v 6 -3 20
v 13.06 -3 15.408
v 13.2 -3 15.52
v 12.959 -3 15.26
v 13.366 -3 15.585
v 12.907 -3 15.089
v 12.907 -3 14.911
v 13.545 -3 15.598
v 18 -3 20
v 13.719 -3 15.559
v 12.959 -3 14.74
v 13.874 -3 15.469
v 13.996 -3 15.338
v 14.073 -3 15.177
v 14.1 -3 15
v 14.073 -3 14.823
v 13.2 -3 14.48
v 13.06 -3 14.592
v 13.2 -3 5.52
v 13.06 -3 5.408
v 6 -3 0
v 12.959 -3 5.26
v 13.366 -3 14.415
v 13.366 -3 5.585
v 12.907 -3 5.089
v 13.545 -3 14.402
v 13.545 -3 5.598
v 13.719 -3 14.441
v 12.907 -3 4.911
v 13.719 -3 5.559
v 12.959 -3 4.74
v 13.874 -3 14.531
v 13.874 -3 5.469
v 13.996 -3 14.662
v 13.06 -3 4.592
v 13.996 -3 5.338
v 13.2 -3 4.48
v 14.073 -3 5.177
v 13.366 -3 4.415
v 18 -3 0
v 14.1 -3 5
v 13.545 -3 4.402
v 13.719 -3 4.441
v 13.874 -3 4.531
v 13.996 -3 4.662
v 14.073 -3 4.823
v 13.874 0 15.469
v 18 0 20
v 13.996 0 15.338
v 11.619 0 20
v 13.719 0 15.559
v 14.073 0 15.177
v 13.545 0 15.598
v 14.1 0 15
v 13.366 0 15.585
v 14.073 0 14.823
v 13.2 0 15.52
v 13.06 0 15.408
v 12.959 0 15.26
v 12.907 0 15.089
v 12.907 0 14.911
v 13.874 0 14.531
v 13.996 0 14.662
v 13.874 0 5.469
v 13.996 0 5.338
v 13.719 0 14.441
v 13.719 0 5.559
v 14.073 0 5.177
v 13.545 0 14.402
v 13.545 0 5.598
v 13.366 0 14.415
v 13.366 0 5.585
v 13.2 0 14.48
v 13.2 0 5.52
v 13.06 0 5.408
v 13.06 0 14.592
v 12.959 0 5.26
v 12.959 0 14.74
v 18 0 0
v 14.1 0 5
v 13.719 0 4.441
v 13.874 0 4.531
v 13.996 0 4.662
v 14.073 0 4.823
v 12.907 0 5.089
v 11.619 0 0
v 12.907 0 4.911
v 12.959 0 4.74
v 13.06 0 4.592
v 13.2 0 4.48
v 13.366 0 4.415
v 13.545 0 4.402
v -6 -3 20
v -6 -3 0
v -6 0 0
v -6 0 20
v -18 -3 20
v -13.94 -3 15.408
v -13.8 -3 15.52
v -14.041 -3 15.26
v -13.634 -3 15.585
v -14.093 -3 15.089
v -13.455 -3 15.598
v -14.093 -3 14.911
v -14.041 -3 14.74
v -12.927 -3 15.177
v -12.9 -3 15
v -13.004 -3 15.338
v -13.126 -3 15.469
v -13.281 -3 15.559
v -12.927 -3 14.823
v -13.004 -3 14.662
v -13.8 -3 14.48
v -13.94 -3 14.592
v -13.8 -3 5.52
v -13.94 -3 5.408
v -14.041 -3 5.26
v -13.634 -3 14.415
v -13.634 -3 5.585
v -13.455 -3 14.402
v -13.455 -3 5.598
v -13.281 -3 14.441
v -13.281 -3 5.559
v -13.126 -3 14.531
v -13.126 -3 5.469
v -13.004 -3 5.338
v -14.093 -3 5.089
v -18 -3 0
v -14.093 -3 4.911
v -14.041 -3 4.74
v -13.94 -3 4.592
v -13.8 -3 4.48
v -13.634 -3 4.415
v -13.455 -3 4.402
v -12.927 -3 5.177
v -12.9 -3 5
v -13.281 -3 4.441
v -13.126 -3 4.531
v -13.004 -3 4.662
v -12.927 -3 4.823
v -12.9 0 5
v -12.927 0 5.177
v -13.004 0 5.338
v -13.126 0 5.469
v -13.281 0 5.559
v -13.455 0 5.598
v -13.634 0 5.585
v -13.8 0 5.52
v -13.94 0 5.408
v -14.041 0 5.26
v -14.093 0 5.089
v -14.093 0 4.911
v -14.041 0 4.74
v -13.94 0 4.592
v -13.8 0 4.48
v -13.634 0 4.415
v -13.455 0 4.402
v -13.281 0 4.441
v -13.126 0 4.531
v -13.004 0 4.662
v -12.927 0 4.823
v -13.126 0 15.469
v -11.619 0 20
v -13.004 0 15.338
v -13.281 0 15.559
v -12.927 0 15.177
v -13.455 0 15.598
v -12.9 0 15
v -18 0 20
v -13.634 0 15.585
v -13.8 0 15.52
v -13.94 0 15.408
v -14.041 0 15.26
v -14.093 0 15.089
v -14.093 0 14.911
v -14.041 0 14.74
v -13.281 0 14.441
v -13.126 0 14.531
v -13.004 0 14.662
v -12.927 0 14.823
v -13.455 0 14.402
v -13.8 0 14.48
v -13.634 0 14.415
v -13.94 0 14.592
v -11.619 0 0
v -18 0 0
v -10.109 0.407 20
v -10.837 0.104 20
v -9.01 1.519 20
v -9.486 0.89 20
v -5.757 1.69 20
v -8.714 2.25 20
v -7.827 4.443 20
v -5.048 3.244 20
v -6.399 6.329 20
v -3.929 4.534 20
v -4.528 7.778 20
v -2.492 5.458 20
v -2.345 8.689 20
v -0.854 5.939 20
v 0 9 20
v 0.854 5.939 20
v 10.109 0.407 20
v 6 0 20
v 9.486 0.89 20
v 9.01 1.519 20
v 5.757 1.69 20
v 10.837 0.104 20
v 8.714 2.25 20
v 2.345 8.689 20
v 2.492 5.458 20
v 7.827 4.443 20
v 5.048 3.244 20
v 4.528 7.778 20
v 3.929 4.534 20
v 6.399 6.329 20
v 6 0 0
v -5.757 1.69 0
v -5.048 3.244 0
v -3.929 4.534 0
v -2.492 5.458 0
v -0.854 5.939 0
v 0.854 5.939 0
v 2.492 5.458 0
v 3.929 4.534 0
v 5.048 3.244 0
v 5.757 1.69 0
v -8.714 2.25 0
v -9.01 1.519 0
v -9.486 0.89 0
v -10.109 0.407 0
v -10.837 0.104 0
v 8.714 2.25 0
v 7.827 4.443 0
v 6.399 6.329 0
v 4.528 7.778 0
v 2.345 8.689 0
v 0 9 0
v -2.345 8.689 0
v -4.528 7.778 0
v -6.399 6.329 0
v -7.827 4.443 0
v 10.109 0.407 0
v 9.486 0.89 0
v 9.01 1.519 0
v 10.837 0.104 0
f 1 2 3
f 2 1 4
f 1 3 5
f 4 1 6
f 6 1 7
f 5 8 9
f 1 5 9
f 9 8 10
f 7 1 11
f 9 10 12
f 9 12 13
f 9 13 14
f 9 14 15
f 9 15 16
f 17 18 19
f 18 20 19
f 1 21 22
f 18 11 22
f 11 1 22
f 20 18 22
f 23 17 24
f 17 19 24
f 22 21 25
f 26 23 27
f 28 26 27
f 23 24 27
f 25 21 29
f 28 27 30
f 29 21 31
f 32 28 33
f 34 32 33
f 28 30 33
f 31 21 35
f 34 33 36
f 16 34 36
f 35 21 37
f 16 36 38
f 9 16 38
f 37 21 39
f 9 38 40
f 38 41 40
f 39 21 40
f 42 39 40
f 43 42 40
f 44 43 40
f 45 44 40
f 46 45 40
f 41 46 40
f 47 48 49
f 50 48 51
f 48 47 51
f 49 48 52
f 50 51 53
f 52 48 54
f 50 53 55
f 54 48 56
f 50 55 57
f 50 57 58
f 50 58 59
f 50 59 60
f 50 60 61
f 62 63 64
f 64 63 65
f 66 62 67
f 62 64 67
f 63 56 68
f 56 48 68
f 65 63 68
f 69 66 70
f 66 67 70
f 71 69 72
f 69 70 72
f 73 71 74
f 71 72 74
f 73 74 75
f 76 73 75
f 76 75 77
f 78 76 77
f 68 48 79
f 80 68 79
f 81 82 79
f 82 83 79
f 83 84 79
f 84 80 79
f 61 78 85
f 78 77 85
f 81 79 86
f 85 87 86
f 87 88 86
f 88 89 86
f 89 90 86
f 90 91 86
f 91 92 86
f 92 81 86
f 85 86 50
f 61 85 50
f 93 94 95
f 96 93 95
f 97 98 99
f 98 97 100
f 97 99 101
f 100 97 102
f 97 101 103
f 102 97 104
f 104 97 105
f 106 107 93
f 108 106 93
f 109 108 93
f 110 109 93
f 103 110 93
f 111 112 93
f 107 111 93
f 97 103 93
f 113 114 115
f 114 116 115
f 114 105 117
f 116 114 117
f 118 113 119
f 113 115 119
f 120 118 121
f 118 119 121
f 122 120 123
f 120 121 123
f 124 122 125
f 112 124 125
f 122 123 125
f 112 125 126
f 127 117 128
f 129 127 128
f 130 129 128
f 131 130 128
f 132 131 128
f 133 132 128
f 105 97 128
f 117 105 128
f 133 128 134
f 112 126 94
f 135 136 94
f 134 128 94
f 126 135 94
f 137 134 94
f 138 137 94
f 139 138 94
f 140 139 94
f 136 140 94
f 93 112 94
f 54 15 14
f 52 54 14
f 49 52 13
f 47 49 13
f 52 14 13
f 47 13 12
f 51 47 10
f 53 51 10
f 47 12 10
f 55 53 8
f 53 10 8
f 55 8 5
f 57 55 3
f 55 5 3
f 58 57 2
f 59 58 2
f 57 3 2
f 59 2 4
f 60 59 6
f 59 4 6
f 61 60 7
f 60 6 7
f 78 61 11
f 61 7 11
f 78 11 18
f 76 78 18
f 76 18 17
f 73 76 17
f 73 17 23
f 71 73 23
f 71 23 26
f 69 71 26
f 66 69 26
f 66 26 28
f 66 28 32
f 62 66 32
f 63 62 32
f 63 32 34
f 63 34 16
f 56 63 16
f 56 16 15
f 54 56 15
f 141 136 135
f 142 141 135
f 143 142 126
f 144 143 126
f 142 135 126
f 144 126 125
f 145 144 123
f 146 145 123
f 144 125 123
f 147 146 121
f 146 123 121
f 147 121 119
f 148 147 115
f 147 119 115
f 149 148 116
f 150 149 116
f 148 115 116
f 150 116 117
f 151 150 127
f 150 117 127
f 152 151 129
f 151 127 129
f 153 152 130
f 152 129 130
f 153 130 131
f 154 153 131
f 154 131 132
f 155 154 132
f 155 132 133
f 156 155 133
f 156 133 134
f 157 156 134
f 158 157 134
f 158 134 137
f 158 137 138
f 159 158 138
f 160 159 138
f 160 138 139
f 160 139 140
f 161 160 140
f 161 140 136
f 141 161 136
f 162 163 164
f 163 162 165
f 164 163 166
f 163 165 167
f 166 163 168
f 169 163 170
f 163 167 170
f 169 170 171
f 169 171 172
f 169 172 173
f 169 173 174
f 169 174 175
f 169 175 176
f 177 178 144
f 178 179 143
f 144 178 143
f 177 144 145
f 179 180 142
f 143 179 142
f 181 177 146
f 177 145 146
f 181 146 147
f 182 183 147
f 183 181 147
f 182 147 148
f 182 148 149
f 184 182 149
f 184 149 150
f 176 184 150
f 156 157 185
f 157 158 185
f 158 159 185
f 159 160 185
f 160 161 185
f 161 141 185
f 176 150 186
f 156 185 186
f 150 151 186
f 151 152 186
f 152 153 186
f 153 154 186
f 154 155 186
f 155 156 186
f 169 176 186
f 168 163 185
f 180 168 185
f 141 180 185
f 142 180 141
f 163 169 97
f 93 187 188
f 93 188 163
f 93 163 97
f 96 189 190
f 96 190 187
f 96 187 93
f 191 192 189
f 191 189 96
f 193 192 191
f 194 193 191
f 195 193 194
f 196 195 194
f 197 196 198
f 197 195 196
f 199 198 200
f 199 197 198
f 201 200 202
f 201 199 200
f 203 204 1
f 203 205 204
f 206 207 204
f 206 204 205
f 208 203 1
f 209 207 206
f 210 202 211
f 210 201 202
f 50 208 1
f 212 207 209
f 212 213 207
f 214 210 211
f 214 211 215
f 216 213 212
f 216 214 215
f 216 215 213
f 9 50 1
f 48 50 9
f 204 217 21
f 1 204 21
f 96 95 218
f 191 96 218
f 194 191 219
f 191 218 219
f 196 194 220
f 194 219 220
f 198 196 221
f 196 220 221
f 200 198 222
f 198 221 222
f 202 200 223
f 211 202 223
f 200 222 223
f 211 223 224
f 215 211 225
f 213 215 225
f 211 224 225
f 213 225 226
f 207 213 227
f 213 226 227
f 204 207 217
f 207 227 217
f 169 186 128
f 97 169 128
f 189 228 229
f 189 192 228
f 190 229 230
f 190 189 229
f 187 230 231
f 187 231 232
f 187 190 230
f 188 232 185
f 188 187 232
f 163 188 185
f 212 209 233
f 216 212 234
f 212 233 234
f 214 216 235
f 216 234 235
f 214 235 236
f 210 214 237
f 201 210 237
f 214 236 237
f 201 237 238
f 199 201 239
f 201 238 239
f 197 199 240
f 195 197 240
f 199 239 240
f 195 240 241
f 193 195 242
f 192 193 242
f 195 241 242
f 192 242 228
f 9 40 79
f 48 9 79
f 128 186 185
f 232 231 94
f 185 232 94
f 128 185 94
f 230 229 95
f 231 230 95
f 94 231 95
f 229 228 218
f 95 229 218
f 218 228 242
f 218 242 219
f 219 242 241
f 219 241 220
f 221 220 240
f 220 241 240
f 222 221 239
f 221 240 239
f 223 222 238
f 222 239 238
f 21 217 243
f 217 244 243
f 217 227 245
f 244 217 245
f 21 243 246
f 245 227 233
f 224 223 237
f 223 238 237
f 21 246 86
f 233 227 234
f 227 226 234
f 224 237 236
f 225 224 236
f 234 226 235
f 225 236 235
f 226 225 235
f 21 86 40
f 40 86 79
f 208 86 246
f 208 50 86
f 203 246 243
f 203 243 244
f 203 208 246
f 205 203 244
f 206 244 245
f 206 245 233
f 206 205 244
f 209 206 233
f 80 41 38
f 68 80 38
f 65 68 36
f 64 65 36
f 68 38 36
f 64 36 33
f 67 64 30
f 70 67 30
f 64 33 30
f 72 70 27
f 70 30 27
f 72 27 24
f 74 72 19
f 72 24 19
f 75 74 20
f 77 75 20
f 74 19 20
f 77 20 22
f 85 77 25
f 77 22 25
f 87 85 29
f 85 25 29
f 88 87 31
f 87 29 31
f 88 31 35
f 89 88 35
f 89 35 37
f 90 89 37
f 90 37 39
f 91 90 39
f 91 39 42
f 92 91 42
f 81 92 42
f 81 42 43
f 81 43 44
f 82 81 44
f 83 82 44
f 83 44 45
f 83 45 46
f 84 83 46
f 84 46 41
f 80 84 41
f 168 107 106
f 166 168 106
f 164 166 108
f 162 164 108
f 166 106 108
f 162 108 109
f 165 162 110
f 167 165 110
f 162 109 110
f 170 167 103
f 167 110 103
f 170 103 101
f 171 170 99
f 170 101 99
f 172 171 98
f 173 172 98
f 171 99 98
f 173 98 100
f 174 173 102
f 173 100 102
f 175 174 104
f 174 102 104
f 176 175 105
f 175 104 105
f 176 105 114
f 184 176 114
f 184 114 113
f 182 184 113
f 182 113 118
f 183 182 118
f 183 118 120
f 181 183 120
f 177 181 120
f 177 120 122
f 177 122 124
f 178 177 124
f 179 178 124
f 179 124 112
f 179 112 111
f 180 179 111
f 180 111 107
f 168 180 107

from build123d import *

# Parameters (mm, degrees)
F1_DEPTH = 20
F3_D     = 1.2
F4_R     = 3


with BuildPart() as f1:
    # F0 (on Top) → F1 (new body)
    with BuildSketch(Plane.XY):
        with BuildLine():
            ThreePointArc((-6, 0), (0, 6), (6, 0))
            Line((6, 0), (6, -3))
            Line((6, -3), (18, -3))
            Line((18, -3), (18, 0))
            Line((18, 0), (9, 0))
            ThreePointArc((9, 0), (0, 9), (-9, 0))
            Line((-9, 0), (-18, 0))
            Line((-18, 0), (-18, -3))
            Line((-18, -3), (-6, -3))
            Line((-6, -3), (-6, 0))
        make_face()
    extrude(amount=F1_DEPTH)

    # F3 (through all)
    with Locations(Plane(origin=(0, 0, 0), x_dir=(-1, 0, 0), z_dir=(0, 1, 0))):
        with Locations((-13.5, 15), (-13.5, 5), (13.5, 15), (13.5, 5)):
            Hole(F3_D / 2)

    # F4
    f4_edges = [f1.edges().sort_by_distance(p)[0] for p in [
        (9, 0, 10),
        (-9, 0, 10),
    ]]
    fillet(f4_edges, radius=F4_R)


solid = f1.part
